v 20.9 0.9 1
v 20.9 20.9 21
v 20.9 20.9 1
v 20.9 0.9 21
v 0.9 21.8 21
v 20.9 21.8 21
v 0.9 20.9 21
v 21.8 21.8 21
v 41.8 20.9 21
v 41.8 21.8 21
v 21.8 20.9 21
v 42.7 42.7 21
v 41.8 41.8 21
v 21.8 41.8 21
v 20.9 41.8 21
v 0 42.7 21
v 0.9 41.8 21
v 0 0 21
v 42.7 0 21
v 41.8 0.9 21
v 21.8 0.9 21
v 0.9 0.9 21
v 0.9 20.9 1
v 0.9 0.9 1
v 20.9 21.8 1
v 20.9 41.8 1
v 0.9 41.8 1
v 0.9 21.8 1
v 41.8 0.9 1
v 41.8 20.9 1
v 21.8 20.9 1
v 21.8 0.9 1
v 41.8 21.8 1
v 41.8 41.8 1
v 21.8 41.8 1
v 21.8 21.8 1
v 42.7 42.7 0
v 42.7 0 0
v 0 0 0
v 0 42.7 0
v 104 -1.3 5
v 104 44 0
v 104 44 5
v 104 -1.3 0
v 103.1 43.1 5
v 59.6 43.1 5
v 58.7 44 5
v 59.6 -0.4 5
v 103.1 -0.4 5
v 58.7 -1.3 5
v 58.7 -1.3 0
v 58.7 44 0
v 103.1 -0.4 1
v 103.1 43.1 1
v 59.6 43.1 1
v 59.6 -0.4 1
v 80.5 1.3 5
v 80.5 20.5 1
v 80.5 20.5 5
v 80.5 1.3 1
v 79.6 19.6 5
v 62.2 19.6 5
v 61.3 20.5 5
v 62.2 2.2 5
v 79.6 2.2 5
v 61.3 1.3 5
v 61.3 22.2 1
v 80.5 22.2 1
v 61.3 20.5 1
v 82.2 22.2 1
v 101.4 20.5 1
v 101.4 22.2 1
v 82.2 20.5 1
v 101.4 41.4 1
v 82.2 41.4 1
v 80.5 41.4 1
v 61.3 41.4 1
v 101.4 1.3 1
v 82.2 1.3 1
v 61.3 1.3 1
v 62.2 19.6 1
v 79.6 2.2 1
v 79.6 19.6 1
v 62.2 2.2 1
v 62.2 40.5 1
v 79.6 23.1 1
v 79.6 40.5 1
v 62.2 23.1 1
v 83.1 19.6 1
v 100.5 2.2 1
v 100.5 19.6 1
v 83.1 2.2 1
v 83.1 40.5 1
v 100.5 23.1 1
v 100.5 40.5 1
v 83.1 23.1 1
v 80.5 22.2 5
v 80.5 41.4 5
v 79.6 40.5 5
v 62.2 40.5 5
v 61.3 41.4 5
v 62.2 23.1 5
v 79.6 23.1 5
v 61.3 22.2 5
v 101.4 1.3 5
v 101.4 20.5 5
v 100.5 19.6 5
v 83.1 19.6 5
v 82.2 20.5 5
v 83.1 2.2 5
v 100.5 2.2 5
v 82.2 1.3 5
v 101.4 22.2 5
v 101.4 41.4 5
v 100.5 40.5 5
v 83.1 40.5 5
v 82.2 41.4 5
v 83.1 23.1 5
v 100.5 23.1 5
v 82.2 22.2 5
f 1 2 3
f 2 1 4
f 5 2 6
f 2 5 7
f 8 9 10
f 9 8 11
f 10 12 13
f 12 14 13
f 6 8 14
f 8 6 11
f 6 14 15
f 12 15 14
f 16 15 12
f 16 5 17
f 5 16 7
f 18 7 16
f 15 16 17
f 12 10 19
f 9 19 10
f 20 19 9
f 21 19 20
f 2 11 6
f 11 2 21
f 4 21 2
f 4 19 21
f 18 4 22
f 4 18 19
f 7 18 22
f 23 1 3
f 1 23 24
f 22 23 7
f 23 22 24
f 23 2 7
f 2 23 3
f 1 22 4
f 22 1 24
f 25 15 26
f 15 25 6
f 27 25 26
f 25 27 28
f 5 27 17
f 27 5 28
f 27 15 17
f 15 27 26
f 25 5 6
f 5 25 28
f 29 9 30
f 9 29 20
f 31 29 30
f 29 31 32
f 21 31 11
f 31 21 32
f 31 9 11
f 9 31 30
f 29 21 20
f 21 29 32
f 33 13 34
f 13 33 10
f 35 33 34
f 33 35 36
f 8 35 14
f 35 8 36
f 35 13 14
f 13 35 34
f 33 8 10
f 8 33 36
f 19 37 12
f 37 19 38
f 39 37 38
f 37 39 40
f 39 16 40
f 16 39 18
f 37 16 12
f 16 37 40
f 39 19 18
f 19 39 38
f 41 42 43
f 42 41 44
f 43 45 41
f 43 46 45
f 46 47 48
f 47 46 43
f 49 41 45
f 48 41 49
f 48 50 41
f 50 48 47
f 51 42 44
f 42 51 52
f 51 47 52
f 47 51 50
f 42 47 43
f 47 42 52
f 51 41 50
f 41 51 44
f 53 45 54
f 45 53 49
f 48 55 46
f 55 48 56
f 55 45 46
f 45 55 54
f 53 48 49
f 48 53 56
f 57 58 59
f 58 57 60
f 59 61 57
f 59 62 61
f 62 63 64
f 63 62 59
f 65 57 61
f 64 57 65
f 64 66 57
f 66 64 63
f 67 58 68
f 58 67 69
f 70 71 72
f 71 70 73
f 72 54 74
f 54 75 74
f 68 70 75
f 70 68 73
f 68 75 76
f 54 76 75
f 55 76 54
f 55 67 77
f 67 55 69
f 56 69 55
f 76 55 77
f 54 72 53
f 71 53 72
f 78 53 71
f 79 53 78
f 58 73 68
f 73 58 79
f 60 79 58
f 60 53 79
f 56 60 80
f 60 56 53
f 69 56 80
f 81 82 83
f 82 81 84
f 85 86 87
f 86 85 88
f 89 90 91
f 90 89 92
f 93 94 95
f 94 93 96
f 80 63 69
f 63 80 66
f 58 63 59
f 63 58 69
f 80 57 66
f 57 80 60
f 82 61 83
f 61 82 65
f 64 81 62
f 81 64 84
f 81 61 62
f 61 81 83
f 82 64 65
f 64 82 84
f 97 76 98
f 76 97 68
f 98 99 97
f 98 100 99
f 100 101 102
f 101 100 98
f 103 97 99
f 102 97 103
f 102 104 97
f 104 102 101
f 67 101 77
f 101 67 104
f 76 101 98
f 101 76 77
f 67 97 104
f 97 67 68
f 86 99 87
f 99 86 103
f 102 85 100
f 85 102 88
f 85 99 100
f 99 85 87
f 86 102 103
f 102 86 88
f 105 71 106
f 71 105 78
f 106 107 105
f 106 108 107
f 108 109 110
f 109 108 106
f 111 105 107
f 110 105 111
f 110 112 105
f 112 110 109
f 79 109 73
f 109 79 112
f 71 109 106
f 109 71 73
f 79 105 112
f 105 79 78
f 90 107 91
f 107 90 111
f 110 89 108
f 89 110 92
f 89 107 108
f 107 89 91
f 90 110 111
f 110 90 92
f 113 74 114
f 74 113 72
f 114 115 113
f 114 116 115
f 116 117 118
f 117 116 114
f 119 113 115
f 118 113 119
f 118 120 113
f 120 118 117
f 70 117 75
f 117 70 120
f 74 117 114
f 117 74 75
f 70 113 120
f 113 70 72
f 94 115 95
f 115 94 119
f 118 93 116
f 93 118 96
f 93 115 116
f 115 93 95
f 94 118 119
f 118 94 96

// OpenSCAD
/* Parametric compartment box by Tomi T. Salo <ttsalo@iki.fi> 2011. */

/* columns: the number of compartments in the X-direction.
   rows: the number of compartments in the Y-direction.
   columnWidth: the internal width of each compartment (in the X-direction).
   rowHeight: the internal height of each compartment (in the Y-direction). 
   boxThickness: the internal thichness of the compartments (in the 
     Z-direction).
   bottomThickness: the thickness of the bottom material.
   topThickness: the thickness of the top material.
   outerWallThickness: the thickness of the outer walls of the bottom 
     section and the outer lip of the top section.
   innerWallThickness: the thickness of the internal walls between 
     compartments.
   topLipThickness: the thickness of the short walls protruding into 
     the compartments.
   topLipHeight: the height of the short walls protruding into the 
     compartments.
   topFitTolerance: extra space between the bottom section parts and the 
     corresponding grooves in the top section (this much between every edge). 
*/

module compartmentBox(columns, rows, columnWidth, rowHeight, boxThickness, 
                      bottomThickness, topThickness, outerWallThickness, 
                      innerWallThickness, topLipThickness, topLipHeight, 
                      topFitTolerance, isBottom) {
  if (isBottom)
    {
      /* The bottom section is modelled by one big cube with the compartments
         subtracted out. */
      difference() {
        cube([columns * columnWidth + (columns - 1) * innerWallThickness + 
              2 * outerWallThickness,
              rows * rowHeight + (rows - 1) * innerWallThickness + 
              2 * outerWallThickness,
              bottomThickness + boxThickness], center = false);
        for (i = [0 : (columns - 1)])
          {
            for (j = [0 : (rows - 1)])
              {
                translate([outerWallThickness + (columnWidth + 
                                                 innerWallThickness) * i,
                           outerWallThickness + (rowHeight + 
                                                 innerWallThickness) * j,
                           bottomThickness]) 
                  cube([columnWidth, rowHeight, boxThickness]);
              }
          }
      }
    } else {
    /* The top is made of an union of: 
       1) Top plate 
       2) Outer top lip made with a difference
       3) Internal compartment lips each made by subtracting the hollow 
          portion out of a solid block. */
    union() {
      translate([-topFitTolerance, -topFitTolerance, 0])
        cube([columns * columnWidth + (columns - 1) * innerWallThickness + 
              2 * outerWallThickness + 2 * topFitTolerance,
              rows * rowHeight + (rows - 1) * innerWallThickness + 
              2 * outerWallThickness +
	      2 * topFitTolerance, topThickness], center = false);
      difference () {
        translate([-(outerWallThickness + topFitTolerance) , 
                   -(outerWallThickness + topFitTolerance), 0])
          cube([columns * columnWidth + (columns - 1) * innerWallThickness + 
                4 * outerWallThickness + 2 * topFitTolerance,
                rows * rowHeight + (rows - 1) * innerWallThickness + 
                4 * outerWallThickness +
                2 * topFitTolerance,
                topThickness + topLipHeight], center = false);
        translate([-topFitTolerance, -topFitTolerance, 0])
          cube([columns * columnWidth + (columns - 1) * innerWallThickness + 
                2 * outerWallThickness + 2 * topFitTolerance,
                rows * rowHeight + (rows - 1) * innerWallThickness + 
                2 * outerWallThickness + 2 * topFitTolerance,
                topThickness + topLipHeight], center = false);
      }
      for (i = [0 : (columns - 1)])
        {
          for (j = [0 : (rows - 1)])
            {
              difference () {
                translate([outerWallThickness + (columnWidth + 
                                                 innerWallThickness) * i +
                           topFitTolerance,
                           outerWallThickness + (rowHeight + 
                                                 innerWallThickness) * j +
                           topFitTolerance,
                           topThickness]) 
                  cube([columnWidth - 2 * topFitTolerance , 
                        rowHeight - 2 * topFitTolerance, topLipHeight]);
                translate([outerWallThickness + (columnWidth + 
                                                 innerWallThickness) * i + 
                           topLipThickness + topFitTolerance,
                           outerWallThickness + (rowHeight + 
                                                 innerWallThickness) * j +
                           topLipThickness + topFitTolerance,
                           topThickness]) cube([columnWidth - 
                                                2 * topLipThickness - 
                                                2 * topFitTolerance, 
                                                rowHeight - 
                                                2 * topLipThickness - 
                                                2 * topFitTolerance, 
                                                topLipHeight]);
              }
            }
        }
    }
  }
}

compartmentBox(2, 2, 20, 20, 20, 1, 1, 2*.45, 2*.45, 2*.45, 4, 0.4, true);
translate([60,0,0])compartmentBox(2, 2, 20, 20, 20, 1, 1, 2*.45, 2*.45, 2*.45, 4, 0.4, false);
